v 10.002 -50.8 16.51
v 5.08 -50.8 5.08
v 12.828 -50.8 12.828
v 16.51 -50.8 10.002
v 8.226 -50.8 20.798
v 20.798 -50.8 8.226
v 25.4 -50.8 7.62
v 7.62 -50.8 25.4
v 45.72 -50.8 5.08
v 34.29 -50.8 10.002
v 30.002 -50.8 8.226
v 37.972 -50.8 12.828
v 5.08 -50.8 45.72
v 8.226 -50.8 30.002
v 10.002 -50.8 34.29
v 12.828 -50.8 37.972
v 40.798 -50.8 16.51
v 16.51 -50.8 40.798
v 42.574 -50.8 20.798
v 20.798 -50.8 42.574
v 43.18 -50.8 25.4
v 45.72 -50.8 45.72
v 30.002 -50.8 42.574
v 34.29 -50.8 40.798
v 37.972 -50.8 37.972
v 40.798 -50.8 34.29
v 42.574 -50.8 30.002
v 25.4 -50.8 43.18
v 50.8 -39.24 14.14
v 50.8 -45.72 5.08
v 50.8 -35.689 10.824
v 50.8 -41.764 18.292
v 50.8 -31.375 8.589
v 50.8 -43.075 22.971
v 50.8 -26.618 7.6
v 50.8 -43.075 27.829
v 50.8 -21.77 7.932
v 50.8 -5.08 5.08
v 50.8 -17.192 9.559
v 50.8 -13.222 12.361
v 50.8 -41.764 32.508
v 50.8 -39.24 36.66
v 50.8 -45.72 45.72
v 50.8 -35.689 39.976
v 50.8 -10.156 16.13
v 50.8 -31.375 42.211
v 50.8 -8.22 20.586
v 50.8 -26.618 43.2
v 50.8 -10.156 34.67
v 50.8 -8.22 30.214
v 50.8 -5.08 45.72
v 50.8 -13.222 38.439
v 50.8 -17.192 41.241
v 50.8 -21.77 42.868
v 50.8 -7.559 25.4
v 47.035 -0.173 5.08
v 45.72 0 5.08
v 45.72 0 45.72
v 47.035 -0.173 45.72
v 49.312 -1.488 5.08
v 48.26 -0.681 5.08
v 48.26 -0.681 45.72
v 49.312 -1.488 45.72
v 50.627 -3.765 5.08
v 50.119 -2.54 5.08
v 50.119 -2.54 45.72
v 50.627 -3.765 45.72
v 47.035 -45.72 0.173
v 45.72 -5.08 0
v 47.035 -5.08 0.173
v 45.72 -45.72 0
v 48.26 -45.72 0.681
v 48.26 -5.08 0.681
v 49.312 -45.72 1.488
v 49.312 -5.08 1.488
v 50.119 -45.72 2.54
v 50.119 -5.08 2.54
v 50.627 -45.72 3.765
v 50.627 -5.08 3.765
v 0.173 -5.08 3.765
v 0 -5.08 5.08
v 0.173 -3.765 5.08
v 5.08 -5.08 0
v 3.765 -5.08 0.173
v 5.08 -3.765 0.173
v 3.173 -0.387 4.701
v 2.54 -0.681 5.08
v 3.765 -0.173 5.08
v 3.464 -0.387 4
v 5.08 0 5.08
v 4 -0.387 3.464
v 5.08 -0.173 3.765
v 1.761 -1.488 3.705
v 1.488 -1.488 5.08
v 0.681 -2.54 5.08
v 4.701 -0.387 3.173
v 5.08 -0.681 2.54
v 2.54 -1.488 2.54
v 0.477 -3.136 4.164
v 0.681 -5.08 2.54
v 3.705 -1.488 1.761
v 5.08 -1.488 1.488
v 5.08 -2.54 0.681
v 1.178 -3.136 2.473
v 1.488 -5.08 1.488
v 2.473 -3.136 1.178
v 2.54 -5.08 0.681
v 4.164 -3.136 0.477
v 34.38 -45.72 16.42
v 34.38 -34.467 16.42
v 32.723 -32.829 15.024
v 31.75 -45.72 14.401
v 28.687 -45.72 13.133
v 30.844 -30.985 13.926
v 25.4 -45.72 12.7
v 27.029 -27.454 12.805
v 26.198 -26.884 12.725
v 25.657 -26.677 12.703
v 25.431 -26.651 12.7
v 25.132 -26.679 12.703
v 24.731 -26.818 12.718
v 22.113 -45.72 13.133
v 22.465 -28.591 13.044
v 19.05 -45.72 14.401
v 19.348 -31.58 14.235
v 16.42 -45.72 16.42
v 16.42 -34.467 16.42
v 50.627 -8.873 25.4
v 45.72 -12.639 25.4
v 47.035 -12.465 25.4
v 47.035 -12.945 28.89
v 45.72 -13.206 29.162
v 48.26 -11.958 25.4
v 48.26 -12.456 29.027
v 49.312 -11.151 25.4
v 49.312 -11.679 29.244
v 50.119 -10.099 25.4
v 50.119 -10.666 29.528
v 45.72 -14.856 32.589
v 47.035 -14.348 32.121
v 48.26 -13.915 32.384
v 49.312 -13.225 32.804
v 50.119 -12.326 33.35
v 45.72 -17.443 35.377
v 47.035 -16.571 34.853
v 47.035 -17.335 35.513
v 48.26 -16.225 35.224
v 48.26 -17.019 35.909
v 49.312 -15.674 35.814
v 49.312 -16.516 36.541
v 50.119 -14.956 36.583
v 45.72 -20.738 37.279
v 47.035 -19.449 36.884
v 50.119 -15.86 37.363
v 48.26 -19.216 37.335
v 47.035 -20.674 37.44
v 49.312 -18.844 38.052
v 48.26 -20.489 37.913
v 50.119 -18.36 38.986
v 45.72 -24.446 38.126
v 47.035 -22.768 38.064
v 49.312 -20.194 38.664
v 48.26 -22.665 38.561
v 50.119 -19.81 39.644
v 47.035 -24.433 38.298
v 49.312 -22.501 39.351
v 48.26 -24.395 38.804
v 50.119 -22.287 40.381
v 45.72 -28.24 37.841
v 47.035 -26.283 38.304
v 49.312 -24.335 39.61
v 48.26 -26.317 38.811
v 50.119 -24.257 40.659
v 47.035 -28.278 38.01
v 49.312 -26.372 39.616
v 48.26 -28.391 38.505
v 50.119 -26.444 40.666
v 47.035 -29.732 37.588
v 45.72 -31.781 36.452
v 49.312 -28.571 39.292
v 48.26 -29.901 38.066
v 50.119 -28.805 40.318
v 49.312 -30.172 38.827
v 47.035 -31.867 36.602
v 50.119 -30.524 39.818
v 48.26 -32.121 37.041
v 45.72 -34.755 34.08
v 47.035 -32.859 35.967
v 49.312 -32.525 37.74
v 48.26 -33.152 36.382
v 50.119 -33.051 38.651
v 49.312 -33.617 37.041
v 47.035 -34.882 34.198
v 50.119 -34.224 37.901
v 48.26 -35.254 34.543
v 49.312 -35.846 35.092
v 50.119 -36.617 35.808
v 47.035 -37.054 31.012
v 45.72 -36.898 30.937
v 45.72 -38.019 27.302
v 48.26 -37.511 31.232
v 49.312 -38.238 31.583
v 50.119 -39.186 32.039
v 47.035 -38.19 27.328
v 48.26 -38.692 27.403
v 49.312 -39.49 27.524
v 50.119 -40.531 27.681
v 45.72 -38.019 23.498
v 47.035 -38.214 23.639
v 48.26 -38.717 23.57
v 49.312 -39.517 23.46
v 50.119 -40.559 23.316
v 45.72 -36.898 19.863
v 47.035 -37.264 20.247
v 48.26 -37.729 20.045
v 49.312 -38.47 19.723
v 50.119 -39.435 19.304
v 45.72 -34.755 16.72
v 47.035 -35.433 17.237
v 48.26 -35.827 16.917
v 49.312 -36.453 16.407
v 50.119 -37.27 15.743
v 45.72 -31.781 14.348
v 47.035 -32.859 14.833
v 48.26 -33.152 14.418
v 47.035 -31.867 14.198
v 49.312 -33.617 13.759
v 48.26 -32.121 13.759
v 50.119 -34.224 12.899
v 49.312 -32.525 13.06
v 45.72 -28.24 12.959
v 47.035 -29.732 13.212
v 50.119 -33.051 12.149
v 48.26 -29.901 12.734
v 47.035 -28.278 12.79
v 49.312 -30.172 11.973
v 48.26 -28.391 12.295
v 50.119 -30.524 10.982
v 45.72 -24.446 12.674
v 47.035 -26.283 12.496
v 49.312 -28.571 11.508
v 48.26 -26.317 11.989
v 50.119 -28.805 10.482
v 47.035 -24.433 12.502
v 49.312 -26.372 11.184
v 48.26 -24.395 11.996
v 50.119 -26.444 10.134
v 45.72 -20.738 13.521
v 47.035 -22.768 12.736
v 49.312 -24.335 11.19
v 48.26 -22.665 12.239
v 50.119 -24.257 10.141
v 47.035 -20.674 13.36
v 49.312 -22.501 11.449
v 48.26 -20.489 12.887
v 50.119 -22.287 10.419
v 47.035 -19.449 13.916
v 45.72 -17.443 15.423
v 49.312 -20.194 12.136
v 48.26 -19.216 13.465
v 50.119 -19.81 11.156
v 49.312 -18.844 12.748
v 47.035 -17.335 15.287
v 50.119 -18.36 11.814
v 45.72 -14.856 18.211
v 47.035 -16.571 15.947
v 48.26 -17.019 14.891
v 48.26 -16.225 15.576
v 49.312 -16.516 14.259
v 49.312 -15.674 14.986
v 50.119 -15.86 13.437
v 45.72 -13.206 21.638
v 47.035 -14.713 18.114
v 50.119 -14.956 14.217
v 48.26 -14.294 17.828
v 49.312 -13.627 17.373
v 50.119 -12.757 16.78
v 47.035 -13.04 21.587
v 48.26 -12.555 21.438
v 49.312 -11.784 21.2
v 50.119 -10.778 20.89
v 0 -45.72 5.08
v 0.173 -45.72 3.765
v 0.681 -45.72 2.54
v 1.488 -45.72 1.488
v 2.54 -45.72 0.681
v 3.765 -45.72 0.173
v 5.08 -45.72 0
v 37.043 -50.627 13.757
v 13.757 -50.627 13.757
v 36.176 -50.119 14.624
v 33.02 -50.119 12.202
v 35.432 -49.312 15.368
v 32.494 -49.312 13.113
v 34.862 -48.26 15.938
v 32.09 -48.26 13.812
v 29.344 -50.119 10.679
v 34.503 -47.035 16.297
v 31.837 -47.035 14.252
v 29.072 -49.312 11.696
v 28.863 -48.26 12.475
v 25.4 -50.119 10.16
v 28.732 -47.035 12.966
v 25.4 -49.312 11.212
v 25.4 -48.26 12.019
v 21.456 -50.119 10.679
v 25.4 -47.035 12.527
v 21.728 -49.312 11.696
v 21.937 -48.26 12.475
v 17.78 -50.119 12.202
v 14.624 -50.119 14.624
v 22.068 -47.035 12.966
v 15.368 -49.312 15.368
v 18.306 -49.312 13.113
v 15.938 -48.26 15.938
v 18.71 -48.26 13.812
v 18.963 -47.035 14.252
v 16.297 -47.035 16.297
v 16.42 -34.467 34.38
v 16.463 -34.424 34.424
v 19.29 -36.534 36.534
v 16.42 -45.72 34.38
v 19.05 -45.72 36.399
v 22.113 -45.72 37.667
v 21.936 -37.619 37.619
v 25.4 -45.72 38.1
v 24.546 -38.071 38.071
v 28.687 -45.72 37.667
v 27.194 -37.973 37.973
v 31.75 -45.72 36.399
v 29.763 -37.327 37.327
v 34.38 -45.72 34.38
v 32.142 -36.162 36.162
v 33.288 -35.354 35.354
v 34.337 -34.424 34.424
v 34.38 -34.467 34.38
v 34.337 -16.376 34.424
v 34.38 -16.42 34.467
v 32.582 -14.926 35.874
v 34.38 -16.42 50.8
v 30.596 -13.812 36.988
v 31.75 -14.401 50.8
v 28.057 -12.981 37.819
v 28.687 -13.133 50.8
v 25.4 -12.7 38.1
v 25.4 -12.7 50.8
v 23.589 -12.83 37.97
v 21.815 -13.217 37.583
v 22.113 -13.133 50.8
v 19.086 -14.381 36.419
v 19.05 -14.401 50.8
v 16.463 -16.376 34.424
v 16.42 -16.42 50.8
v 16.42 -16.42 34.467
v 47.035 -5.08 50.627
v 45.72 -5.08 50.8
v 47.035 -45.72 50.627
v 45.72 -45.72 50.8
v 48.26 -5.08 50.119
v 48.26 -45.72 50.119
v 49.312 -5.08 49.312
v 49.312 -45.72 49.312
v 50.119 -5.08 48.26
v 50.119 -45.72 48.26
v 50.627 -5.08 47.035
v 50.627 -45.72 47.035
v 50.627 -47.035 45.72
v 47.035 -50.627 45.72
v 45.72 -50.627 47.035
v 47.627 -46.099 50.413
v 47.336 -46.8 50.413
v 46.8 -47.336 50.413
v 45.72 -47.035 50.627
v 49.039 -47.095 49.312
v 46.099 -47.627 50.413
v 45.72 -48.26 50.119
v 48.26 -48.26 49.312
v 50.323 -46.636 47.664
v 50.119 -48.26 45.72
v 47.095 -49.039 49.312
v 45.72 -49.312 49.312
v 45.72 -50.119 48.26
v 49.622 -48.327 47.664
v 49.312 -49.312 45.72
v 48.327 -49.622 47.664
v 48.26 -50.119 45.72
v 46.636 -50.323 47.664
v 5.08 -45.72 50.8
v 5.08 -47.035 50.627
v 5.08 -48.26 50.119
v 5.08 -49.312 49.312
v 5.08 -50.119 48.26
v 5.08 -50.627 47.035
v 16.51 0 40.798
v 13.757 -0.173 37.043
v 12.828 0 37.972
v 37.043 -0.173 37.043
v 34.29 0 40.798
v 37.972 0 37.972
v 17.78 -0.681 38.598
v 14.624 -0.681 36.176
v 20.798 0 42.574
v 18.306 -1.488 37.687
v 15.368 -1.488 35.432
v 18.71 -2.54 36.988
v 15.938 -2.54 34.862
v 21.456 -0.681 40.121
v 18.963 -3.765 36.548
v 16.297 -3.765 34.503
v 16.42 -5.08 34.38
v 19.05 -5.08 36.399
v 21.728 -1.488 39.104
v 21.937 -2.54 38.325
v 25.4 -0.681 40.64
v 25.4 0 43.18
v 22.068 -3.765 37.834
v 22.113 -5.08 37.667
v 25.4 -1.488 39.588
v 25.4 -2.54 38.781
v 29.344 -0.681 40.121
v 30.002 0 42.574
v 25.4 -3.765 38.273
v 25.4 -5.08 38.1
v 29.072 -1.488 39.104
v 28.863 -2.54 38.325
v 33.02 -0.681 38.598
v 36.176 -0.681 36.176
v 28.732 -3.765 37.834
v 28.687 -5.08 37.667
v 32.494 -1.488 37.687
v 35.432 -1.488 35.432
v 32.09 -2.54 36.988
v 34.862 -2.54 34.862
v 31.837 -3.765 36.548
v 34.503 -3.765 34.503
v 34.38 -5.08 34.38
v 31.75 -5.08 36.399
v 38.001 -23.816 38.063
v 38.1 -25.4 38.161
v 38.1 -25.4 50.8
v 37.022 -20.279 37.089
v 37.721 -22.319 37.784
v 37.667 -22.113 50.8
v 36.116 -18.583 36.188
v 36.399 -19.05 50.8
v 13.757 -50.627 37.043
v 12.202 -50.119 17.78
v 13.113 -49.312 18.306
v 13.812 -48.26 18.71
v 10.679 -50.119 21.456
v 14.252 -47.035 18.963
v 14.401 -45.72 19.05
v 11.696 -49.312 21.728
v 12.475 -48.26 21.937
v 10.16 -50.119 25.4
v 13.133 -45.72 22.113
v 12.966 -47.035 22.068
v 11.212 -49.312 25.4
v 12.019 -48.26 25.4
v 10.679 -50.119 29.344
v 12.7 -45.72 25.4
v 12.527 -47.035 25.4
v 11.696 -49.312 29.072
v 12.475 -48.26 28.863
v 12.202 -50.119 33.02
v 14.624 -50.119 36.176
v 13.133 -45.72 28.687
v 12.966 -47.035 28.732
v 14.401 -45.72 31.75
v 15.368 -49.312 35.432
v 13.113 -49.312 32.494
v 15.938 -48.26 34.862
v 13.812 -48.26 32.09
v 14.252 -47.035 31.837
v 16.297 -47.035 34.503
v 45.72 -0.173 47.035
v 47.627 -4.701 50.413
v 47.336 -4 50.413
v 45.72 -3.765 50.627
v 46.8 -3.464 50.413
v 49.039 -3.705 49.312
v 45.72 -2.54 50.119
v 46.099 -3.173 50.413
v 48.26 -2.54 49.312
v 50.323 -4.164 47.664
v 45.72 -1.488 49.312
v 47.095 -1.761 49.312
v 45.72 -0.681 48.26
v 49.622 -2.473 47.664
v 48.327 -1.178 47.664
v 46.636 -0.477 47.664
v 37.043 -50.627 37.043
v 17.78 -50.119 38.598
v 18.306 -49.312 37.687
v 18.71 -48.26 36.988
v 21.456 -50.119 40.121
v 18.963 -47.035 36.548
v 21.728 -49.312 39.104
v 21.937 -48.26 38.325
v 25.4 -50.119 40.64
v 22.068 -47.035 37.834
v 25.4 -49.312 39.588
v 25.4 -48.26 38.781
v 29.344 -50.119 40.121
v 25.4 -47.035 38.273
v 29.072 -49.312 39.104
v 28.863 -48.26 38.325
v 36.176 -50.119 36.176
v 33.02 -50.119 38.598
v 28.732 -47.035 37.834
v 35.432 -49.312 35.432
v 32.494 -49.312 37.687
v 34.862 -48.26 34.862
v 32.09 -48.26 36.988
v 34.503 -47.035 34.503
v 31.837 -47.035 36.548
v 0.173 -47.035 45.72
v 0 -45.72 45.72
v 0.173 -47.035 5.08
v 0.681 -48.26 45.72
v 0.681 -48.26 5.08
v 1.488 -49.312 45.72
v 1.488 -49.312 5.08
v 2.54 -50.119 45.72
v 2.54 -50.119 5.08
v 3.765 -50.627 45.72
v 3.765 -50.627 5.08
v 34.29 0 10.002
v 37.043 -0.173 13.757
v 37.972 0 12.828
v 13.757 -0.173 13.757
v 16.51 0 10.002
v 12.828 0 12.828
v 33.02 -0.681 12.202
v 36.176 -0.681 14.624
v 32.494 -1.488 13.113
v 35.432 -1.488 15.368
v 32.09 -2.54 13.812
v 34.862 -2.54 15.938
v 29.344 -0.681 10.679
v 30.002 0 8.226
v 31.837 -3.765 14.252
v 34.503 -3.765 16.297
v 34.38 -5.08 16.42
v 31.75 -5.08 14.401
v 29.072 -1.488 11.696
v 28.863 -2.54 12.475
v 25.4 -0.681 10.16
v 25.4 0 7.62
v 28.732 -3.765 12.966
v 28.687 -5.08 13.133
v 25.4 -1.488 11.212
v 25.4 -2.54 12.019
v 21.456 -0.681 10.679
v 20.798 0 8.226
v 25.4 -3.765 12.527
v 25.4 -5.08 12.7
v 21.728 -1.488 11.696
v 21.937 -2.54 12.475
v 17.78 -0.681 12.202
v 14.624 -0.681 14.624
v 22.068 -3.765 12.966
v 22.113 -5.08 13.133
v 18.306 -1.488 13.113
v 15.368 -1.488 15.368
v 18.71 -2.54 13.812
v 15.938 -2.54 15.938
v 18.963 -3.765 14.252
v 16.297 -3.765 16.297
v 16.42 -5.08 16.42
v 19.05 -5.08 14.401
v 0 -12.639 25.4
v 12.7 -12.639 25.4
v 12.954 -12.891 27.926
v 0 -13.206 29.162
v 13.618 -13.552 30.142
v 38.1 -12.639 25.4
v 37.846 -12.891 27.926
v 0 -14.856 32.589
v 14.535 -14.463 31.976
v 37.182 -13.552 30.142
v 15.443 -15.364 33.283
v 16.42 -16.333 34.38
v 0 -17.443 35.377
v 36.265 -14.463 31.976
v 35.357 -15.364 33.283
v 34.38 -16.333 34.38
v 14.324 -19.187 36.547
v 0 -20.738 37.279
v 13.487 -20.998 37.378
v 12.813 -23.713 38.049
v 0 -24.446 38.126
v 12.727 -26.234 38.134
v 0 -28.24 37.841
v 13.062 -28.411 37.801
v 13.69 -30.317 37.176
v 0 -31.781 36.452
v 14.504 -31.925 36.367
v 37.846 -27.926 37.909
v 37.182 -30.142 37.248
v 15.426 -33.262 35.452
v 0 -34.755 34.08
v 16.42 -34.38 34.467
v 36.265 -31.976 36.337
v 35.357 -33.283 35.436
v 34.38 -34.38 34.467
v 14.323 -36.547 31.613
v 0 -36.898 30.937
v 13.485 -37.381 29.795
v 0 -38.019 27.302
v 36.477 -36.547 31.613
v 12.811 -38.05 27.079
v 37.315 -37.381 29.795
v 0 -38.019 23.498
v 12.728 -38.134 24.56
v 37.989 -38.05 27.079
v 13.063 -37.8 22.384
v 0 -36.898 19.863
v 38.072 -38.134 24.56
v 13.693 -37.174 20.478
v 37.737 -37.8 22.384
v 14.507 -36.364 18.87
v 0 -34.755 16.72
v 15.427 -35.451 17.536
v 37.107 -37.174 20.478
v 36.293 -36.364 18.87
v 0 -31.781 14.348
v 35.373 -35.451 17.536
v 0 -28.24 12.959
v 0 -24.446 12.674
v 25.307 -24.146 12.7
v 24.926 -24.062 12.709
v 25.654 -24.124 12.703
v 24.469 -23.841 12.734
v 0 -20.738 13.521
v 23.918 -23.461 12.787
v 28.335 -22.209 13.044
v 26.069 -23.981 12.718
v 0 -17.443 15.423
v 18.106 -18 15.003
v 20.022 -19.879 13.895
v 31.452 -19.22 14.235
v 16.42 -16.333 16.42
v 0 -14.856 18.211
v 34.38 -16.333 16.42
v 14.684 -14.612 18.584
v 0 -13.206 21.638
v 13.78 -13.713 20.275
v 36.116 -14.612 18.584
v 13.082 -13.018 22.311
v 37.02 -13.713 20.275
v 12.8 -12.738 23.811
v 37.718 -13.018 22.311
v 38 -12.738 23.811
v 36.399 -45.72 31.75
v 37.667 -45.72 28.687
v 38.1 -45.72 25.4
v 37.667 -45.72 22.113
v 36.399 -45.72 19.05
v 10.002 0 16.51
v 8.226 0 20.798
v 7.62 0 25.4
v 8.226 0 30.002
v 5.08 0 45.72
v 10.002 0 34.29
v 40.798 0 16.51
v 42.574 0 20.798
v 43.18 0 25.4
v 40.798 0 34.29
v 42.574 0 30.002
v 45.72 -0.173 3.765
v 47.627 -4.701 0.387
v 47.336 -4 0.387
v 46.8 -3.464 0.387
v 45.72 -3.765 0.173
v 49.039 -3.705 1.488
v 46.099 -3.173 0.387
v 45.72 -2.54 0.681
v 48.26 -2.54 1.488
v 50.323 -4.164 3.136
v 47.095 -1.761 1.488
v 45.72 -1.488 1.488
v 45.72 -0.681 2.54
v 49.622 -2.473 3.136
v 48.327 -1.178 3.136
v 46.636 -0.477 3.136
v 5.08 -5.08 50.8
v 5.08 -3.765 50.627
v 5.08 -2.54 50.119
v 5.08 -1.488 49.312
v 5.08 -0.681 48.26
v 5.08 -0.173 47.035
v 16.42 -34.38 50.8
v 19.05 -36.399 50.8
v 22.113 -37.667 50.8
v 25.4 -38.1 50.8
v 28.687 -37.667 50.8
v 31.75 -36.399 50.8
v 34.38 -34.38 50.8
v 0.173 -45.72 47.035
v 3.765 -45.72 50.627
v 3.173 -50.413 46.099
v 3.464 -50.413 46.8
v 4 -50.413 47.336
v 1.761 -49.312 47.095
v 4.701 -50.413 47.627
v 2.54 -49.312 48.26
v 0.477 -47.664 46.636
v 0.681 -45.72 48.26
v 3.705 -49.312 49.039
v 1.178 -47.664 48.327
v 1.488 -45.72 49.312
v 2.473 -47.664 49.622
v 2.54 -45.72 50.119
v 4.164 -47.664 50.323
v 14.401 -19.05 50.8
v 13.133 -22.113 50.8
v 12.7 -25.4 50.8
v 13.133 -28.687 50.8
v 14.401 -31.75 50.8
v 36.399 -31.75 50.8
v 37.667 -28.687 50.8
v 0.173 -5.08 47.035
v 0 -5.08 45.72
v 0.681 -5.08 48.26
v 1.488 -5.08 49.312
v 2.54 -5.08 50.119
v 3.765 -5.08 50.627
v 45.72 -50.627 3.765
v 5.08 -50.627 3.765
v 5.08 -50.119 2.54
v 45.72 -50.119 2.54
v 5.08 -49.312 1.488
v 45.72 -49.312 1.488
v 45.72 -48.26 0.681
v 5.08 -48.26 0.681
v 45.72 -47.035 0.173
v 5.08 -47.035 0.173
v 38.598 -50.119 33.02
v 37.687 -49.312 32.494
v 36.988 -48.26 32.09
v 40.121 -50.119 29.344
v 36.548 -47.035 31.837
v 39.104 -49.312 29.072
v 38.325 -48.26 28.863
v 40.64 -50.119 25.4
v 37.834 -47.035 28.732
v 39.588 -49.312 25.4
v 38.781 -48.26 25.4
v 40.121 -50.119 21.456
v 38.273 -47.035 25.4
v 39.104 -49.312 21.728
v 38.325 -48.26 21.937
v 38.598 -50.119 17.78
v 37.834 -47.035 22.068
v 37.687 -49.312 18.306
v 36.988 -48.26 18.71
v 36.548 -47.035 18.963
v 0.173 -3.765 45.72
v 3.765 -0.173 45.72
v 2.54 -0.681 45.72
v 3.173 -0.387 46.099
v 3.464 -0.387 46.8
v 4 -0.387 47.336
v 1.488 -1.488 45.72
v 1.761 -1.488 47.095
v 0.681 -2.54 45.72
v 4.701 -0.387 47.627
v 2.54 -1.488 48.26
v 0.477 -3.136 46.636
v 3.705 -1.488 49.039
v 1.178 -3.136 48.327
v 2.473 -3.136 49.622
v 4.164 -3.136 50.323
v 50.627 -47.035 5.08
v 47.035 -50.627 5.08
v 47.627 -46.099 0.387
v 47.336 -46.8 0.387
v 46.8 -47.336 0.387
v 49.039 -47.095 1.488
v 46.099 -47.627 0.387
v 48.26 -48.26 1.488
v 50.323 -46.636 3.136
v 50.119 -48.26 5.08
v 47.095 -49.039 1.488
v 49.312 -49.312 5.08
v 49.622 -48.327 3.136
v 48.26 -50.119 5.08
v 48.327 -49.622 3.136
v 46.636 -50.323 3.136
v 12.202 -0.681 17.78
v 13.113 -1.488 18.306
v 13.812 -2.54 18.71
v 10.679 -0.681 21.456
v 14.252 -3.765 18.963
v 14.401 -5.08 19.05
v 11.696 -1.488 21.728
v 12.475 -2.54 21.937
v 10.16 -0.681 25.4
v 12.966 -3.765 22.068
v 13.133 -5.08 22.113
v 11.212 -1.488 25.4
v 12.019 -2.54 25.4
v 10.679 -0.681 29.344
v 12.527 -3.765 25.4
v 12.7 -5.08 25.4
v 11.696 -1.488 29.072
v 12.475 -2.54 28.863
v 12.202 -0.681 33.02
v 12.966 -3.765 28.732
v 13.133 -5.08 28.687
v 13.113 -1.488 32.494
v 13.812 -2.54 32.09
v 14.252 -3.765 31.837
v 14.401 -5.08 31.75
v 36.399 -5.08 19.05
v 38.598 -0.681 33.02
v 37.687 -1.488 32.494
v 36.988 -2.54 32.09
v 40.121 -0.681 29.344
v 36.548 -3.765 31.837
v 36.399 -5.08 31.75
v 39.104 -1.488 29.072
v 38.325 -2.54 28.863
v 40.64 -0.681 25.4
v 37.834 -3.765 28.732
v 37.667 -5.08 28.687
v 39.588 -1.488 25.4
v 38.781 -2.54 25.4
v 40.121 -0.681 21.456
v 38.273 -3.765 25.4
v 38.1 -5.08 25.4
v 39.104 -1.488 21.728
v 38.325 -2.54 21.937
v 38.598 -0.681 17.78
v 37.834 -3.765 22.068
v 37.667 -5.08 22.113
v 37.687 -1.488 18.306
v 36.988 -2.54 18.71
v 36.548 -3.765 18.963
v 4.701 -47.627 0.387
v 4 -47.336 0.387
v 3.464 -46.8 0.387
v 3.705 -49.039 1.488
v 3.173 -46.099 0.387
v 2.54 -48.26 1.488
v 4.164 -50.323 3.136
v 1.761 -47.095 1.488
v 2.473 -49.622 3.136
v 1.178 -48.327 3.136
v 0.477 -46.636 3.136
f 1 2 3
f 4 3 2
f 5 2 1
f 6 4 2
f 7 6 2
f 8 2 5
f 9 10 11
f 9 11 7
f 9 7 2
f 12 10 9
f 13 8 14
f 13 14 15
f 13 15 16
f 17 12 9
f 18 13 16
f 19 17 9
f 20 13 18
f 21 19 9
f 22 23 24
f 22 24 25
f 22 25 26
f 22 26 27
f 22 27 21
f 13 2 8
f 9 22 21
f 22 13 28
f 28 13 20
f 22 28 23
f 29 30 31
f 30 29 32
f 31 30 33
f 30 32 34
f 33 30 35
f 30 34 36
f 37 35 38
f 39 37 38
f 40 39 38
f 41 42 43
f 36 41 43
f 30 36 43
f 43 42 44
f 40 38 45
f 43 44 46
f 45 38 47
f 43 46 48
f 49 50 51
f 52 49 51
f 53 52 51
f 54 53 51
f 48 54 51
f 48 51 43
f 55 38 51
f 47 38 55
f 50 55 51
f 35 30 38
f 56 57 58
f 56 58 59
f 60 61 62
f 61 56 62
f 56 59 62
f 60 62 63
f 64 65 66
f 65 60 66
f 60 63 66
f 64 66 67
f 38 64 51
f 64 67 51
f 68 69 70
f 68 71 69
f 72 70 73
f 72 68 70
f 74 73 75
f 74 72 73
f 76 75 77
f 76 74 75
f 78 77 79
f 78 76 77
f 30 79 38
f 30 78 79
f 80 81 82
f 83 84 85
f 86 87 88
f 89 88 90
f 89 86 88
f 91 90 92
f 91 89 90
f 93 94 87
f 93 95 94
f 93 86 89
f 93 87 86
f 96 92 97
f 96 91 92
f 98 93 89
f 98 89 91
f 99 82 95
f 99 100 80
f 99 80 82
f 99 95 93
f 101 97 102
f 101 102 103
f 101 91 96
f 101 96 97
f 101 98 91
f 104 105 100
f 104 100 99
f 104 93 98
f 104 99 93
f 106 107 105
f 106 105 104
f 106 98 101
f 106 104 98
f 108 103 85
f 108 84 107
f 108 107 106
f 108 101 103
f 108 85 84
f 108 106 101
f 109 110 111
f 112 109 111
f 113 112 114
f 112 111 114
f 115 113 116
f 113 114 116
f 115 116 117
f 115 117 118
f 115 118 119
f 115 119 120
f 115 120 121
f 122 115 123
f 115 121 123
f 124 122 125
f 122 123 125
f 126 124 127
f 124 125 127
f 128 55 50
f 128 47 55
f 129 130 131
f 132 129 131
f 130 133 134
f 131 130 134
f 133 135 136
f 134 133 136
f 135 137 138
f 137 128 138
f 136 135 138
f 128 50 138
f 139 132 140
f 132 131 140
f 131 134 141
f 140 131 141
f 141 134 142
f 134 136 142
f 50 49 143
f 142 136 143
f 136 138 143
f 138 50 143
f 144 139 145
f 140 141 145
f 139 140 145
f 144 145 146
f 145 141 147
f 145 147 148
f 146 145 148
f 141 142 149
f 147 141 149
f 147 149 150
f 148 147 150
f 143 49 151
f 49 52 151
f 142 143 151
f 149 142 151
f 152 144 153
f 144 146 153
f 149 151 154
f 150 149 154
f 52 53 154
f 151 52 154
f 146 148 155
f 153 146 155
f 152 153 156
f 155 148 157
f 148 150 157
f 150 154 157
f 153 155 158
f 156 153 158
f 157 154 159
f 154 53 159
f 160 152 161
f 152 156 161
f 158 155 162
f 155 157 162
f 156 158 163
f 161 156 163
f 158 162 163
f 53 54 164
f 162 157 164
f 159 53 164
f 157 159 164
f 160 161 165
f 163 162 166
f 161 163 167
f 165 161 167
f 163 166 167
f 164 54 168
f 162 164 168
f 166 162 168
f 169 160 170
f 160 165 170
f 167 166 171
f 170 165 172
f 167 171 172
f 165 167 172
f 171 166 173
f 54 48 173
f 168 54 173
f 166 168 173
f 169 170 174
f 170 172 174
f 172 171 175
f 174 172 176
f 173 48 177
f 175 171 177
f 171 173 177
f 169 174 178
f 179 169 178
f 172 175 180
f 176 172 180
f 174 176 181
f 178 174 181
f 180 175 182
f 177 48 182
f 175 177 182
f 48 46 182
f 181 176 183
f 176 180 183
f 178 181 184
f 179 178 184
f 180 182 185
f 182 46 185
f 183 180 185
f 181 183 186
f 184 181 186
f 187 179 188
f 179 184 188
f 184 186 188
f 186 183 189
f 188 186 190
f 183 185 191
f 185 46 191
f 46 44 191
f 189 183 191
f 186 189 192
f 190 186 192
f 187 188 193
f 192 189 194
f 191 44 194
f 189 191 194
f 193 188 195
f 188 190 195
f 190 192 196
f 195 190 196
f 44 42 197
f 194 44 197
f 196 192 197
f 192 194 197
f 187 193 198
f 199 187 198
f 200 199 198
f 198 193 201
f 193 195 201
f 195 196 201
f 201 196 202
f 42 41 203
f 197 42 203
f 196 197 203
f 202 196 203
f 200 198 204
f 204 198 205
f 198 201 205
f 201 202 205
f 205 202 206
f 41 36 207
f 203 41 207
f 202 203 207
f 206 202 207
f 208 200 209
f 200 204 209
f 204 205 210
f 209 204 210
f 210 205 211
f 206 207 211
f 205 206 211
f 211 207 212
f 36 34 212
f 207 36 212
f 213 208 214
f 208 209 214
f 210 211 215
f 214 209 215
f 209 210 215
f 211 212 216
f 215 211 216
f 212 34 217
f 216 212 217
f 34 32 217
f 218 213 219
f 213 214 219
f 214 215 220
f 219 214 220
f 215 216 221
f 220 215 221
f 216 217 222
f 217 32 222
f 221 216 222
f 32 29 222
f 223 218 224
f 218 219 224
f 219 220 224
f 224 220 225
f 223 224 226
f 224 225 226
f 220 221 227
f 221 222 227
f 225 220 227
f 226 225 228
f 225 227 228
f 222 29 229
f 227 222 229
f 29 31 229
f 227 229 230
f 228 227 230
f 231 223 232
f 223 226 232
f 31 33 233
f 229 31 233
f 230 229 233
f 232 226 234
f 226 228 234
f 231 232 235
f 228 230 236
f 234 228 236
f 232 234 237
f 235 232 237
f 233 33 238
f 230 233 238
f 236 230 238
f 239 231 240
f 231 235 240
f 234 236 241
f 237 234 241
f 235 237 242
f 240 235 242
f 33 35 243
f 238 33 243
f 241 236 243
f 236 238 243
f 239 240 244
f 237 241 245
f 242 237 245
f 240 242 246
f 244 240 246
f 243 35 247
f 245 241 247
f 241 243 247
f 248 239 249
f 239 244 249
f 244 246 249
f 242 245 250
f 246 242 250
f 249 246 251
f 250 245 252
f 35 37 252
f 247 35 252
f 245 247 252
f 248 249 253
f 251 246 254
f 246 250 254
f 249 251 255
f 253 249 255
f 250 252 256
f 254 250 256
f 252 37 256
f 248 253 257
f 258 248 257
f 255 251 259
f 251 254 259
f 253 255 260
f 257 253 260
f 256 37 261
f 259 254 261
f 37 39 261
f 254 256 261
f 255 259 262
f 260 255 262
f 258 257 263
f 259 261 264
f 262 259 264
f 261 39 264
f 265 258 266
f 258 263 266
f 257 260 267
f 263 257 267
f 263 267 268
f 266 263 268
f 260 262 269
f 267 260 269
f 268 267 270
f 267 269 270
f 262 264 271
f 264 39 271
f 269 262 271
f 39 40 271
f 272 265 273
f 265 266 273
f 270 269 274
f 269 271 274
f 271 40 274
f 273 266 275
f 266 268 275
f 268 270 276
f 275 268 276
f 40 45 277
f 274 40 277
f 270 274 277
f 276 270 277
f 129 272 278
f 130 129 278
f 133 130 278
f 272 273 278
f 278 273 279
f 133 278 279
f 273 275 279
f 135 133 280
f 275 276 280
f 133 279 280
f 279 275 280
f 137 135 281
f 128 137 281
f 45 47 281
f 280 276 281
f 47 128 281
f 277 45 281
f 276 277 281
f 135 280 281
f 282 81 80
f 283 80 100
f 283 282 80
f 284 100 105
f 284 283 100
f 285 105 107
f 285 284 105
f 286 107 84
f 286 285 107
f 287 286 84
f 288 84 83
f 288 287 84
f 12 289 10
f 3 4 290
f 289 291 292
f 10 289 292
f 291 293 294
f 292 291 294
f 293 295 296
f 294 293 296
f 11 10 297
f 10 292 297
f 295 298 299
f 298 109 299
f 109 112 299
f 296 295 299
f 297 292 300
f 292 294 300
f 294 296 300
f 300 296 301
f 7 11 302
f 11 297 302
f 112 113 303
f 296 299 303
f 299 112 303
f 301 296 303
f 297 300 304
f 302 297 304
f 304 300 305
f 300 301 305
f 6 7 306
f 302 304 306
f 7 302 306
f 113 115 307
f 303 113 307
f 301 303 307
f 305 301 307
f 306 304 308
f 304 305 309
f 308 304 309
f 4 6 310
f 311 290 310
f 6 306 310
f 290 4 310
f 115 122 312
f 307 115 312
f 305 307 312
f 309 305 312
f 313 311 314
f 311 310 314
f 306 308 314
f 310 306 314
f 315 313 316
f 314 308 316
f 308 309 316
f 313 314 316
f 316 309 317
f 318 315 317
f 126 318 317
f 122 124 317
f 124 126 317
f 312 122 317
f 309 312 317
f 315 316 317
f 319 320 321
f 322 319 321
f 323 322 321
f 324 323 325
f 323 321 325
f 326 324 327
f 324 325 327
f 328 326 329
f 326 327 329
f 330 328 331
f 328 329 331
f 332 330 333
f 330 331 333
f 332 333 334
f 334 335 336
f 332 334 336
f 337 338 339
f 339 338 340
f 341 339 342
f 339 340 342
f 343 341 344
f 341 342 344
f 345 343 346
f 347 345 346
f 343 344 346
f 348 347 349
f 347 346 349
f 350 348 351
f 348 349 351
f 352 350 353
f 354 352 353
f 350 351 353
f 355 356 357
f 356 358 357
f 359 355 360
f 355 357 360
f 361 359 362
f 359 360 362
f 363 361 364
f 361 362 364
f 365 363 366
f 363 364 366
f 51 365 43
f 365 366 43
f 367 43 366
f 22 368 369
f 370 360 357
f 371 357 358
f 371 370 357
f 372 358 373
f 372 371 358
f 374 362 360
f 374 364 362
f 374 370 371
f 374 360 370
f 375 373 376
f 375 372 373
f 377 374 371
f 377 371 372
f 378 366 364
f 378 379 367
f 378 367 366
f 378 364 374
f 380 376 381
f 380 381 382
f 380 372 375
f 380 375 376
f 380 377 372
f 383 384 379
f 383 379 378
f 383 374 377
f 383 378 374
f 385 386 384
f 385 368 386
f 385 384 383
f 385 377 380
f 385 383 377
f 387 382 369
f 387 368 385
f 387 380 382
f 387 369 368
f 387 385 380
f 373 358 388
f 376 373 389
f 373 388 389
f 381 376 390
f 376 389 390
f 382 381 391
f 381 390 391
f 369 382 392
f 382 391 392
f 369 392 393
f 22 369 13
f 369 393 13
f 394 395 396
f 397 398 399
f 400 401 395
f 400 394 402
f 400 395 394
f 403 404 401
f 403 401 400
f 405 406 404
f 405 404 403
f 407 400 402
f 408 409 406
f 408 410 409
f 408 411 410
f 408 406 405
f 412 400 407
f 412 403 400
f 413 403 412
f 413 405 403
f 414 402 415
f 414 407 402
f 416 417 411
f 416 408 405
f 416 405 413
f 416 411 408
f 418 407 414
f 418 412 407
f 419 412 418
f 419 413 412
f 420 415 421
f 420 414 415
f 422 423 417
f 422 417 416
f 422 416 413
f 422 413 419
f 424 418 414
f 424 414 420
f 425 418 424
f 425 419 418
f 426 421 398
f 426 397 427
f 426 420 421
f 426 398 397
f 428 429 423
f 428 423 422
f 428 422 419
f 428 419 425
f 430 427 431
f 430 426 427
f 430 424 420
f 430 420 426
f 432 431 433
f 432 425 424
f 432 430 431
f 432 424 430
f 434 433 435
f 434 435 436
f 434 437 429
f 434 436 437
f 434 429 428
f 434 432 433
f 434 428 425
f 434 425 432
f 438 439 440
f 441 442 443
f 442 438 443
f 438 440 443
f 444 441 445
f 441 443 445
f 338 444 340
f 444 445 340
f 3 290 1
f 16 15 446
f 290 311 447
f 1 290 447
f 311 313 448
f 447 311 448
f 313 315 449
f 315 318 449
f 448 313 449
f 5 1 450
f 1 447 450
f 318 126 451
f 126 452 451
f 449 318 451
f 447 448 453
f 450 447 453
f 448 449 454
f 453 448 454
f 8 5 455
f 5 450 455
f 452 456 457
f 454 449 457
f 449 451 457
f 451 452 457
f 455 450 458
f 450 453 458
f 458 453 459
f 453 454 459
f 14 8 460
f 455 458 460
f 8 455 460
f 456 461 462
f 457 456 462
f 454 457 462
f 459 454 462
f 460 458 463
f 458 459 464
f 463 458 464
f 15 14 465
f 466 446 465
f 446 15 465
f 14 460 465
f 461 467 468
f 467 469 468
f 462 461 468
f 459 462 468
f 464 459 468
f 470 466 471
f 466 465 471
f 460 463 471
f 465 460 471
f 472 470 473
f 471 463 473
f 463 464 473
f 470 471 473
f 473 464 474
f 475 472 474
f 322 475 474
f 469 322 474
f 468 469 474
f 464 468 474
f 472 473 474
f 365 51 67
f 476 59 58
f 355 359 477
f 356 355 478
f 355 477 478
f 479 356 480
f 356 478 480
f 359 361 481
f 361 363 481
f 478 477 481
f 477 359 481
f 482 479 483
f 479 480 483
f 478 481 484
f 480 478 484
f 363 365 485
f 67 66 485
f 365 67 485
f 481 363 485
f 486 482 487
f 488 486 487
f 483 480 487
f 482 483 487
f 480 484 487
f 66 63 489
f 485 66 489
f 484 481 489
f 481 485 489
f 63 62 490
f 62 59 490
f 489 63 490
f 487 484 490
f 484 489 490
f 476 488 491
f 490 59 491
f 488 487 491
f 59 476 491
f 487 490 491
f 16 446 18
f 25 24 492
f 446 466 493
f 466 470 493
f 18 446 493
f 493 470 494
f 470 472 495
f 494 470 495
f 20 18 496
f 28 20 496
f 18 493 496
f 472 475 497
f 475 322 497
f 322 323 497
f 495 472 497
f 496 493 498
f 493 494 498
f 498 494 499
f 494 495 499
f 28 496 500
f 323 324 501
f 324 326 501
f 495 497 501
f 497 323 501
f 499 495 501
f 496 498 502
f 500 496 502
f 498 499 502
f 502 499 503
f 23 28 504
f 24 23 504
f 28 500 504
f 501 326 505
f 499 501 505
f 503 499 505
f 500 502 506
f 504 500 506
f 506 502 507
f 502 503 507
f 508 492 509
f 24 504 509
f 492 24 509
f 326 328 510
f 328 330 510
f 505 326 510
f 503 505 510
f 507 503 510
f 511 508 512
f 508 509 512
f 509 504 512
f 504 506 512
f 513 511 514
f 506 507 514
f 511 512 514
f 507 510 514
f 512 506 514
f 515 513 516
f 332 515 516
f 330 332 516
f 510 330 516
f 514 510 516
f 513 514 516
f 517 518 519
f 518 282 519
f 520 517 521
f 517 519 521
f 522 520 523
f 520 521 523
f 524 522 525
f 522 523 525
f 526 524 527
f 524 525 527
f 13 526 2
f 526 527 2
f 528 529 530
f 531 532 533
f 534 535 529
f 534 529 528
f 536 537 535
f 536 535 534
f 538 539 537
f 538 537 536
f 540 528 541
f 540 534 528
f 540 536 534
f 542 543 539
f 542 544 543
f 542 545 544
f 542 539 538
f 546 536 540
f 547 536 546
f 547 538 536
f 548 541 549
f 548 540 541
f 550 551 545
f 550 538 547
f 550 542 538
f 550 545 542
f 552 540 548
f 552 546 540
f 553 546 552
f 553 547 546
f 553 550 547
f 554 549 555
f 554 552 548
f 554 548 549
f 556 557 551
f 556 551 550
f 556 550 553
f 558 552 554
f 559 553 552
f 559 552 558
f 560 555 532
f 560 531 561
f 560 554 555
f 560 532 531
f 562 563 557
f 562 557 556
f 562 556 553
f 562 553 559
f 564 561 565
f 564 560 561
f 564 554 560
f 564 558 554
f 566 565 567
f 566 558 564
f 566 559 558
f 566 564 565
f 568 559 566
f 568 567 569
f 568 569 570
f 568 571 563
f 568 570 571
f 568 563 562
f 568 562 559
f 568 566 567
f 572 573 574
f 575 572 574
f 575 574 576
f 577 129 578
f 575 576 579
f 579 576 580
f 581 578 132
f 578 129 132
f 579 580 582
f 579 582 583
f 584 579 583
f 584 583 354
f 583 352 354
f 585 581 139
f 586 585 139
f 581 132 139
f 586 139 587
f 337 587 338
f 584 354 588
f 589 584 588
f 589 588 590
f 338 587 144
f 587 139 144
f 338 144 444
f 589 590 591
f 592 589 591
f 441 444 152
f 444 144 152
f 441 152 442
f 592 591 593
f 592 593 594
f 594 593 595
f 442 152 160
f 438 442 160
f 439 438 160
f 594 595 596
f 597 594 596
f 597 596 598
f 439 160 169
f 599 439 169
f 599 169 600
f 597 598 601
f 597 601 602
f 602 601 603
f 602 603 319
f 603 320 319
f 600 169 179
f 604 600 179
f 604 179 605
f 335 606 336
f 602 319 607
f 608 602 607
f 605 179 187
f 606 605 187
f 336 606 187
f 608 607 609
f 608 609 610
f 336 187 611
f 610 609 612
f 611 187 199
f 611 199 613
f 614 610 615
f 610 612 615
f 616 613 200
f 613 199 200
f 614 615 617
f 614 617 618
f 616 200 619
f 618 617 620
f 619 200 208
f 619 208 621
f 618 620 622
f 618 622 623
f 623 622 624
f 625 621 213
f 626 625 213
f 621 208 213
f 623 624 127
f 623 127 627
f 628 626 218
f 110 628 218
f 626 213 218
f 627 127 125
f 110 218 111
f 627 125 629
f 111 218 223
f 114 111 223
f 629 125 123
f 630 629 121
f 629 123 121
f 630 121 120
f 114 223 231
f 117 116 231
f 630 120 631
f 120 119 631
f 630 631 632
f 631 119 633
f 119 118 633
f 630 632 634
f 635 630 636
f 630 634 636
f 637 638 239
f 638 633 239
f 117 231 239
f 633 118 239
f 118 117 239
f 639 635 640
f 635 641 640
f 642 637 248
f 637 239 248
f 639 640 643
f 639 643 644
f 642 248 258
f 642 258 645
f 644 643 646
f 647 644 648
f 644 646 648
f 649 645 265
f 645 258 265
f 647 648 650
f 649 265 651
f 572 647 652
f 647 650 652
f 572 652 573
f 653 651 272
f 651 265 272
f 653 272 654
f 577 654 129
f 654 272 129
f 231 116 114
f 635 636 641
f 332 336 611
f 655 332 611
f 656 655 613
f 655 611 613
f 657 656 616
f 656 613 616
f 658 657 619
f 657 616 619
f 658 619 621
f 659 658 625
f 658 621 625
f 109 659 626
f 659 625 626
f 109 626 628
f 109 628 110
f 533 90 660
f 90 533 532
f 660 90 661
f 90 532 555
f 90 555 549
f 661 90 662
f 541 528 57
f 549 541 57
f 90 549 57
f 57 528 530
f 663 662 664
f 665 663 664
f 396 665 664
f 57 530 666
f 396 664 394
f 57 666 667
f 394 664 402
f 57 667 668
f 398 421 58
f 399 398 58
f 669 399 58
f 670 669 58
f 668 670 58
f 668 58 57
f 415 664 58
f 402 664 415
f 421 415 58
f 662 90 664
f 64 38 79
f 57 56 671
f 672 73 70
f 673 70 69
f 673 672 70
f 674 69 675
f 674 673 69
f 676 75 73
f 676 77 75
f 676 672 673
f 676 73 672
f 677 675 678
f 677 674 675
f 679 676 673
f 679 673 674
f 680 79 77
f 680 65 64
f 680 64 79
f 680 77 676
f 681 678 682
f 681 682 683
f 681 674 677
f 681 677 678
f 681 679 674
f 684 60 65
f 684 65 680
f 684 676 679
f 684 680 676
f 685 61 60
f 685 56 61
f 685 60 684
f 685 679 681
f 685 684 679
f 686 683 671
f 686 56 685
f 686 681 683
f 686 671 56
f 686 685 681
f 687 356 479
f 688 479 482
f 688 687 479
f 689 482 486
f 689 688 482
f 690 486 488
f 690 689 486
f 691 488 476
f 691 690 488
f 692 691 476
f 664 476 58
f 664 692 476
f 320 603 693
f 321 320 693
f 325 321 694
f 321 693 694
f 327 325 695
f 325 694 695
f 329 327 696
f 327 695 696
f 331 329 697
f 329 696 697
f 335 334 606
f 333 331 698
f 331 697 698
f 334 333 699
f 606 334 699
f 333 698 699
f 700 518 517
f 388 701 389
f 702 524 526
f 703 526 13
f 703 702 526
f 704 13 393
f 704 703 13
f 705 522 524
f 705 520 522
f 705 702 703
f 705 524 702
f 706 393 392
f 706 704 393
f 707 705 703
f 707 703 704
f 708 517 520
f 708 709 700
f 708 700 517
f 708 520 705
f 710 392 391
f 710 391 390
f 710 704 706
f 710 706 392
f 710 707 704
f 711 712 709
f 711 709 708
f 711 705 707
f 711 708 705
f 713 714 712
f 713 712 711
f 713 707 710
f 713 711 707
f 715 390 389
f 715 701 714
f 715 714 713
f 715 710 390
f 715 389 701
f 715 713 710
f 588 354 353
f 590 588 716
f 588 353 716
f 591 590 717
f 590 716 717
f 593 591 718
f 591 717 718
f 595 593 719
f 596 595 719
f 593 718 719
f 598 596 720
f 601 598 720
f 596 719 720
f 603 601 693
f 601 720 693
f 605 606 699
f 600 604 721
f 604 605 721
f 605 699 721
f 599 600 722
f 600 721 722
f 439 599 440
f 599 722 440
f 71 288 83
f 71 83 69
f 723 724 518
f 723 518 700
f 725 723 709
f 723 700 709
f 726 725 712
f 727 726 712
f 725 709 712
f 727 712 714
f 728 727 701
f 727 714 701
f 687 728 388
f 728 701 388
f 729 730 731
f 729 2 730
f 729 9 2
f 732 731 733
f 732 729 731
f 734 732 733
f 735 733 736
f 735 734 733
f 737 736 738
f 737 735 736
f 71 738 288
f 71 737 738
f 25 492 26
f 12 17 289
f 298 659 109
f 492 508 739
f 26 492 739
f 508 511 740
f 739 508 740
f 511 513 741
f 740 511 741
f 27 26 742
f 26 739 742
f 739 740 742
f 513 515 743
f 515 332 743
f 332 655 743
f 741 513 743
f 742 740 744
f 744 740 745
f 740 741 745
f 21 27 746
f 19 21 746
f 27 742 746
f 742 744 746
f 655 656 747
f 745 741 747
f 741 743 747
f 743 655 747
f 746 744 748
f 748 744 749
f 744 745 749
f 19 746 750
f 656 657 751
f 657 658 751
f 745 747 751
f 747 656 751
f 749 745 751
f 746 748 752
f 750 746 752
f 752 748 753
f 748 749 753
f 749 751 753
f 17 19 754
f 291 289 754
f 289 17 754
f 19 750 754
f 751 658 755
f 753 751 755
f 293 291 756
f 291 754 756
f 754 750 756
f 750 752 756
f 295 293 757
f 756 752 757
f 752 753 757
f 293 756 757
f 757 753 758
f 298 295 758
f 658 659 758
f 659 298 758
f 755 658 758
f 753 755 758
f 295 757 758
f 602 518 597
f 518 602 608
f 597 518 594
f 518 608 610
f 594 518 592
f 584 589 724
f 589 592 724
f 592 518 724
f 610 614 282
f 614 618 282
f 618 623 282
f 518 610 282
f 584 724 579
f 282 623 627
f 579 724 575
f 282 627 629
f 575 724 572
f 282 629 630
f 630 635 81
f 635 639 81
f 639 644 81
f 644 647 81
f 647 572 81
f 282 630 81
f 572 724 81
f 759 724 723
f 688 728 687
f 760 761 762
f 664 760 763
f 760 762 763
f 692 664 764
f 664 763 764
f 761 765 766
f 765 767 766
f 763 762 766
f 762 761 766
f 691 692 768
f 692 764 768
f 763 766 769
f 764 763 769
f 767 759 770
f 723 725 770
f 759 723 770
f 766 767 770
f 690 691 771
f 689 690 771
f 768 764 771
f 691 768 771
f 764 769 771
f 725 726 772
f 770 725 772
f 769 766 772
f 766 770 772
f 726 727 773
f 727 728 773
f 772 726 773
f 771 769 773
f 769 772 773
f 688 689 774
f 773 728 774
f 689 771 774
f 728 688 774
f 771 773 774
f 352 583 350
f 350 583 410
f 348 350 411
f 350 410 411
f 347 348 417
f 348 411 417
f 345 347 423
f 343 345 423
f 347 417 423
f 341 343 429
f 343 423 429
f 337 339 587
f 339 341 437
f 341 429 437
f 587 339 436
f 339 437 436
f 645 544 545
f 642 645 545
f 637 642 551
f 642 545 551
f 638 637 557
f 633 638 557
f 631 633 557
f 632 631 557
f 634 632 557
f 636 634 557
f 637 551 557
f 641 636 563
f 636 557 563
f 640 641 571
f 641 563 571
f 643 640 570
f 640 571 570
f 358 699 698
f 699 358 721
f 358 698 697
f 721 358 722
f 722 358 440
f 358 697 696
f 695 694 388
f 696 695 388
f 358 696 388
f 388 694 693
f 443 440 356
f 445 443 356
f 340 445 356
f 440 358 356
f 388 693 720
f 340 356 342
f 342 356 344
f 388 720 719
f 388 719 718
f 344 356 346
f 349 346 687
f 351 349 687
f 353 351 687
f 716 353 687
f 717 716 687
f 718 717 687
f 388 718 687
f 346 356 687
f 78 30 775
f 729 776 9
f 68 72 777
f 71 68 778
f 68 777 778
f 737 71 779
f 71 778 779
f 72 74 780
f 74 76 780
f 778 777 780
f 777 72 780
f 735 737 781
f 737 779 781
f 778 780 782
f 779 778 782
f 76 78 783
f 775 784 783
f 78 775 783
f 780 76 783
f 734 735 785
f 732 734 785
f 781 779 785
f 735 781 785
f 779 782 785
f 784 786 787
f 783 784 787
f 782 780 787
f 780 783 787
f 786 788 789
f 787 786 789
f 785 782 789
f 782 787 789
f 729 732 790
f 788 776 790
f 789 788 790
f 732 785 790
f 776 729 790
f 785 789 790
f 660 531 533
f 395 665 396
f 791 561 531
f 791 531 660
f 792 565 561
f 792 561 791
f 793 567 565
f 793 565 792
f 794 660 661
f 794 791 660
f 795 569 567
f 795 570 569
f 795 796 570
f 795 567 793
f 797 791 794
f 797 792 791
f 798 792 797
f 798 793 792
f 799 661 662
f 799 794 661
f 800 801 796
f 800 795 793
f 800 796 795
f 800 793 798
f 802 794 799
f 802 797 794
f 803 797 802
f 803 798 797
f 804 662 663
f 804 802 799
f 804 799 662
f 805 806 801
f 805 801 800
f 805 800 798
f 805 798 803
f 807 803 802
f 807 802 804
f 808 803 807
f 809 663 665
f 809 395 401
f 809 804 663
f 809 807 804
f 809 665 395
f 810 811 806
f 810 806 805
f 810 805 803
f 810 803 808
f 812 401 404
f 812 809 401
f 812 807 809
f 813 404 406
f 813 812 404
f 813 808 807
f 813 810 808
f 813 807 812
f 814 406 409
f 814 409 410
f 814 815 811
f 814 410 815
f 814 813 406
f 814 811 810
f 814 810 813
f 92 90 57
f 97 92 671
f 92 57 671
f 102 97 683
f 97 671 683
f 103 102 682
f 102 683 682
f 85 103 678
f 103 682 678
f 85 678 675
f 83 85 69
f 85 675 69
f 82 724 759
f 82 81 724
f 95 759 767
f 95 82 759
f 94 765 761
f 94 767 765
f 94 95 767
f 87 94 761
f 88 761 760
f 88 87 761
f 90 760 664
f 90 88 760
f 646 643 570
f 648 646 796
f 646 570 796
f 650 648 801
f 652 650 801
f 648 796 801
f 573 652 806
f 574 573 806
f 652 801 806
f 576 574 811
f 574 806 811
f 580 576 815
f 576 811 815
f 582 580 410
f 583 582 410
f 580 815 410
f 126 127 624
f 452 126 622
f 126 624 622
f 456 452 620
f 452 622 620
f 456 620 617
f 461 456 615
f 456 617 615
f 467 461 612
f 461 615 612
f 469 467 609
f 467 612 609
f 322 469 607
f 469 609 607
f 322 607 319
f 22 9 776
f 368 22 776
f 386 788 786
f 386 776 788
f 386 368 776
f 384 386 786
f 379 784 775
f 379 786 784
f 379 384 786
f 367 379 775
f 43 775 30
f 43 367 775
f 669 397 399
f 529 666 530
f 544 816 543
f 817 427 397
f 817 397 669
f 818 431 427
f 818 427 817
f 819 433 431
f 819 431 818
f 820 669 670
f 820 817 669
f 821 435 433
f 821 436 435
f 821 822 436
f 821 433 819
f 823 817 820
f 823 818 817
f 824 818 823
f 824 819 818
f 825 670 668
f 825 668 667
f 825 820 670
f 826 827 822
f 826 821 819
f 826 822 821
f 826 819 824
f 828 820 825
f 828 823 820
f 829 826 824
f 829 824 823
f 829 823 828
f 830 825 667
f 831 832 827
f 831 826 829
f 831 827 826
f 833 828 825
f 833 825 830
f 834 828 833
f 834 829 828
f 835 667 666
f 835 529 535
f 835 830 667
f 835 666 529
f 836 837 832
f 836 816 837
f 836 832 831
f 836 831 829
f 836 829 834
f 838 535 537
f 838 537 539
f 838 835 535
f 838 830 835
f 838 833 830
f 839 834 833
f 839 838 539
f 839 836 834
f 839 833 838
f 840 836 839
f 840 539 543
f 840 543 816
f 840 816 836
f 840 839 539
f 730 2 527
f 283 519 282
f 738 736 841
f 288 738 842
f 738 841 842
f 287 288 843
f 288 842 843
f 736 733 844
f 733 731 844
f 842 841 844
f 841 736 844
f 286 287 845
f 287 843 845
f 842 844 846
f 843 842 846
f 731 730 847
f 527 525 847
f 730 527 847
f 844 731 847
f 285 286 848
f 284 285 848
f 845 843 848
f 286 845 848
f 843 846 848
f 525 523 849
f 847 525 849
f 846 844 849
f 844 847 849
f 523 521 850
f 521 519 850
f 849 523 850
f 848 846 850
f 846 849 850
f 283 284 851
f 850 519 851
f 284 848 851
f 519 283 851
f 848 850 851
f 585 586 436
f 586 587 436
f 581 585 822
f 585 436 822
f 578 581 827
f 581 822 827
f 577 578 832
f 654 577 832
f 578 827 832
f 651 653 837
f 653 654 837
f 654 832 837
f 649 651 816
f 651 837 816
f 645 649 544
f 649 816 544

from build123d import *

# Parameters (mm, degrees)
F1_DEPTH = 50.8
F3_R     = 12.7614495694
F4_DEPTH = 50.8
F5_DEPTH = 25.4
F6_R     = 5.08


with BuildPart() as f1:
    # F0 (on Front) → F1 (new body)
    with BuildSketch(Plane.XZ):
        with BuildLine():
            Line((0, 50.8000037167), (0, 0))
            Line((0, 0), (16.4197442074, 16.4197454088))
            ThreePointArc((16.4197442074, 16.4197454088), (12.7, 25.4000018583), (16.4197442074, 34.3802583079))
            Line((16.4197442074, 34.3802583079), (0, 50.8000037167))
        make_face()
        with BuildLine():
            Line((50.8, 50.8000037167), (0, 50.8000037167))
            Line((0, 50.8000037167), (16.4197442074, 34.3802583079))
            ThreePointArc((16.4197442074, 34.3802583079), (25.4, 38.1000018583), (34.3802557926, 34.3802583079))
            Line((34.3802557926, 34.3802583079), (50.8, 50.8000037167))
        make_face()
        with BuildLine():
            Line((34.3802557926, 16.4197454088), (50.8, 0))
            Line((50.8, 0), (50.8, 50.8000037167))
            Line((50.8, 50.8000037167), (34.3802557926, 34.3802583079))
            ThreePointArc((34.3802557926, 34.3802583079), (37.133269974, 30.260081664), (38.1, 25.4000018583))
            ThreePointArc((38.1, 25.4000018583), (37.133269974, 20.5399220527), (34.3802557926, 16.4197454088))
        make_face()
        with BuildLine():
            Line((16.4197442074, 16.4197454088), (0, 0))
            Line((0, 0), (50.8, 0))
            Line((50.8, 0), (34.3802557926, 16.4197454088))
            ThreePointArc((34.3802557926, 16.4197454088), (25.4, 12.7000018583), (16.4197442074, 16.4197454088))
        make_face()
    extrude(amount=F1_DEPTH)

    # F3 (on face) → F4 (cut)
    with BuildSketch(Plane.YZ.offset(50.8)):
        with Locations((-25.4, 25.4000018583)):
            Circle(F3_R)
    extrude(amount=-F4_DEPTH, mode=Mode.SUBTRACT)

    # F2 (on face) → F5 (cut)
    with BuildSketch(Plane.XY.offset(50.8000037167)):
        with BuildLine():
            ThreePointArc((38.1, -25.4), (37.1332700629, -20.539920409), (34.3802561211, -16.4197438789))
            Line((34.3802561211, -16.4197438789), (25.4, -25.4))
            Line((25.4, -25.4), (34.3802561211, -34.3802561211))
            ThreePointArc((34.3802561211, -34.3802561211), (37.1332700629, -30.260079591), (38.1, -25.4))
        make_face()
        with BuildLine():
            Line((25.4, -25.4), (34.3802561211, -16.4197438789))
            ThreePointArc((34.3802561211, -16.4197438789), (25.4, -12.7), (16.4197438789, -16.4197438789))
            Line((16.4197438789, -16.4197438789), (25.4, -25.4))
        make_face()
        with BuildLine():
            Line((34.3802561211, -34.3802561211), (25.4, -25.4))
            Line((25.4, -25.4), (16.4197438789, -34.3802561211))
            ThreePointArc((16.4197438789, -34.3802561211), (25.4, -38.1), (34.3802561211, -34.3802561211))
        make_face()
        with BuildLine():
            Line((16.4197438789, -34.3802561211), (25.4, -25.4))
            Line((25.4, -25.4), (16.4197438789, -16.4197438789))
            ThreePointArc((16.4197438789, -16.4197438789), (12.7, -25.4), (16.4197438789, -34.3802561211))
        make_face()
    extrude(amount=-F5_DEPTH, mode=Mode.SUBTRACT)

    # F6
    f6_edges = [f1.edges().sort_by_distance(p)[0] for p in [
        (0, -25.4, 50.800004),
        (0, -50.8, 25.400002),
        (50.8, -50.8, 25.400002),
        (50.8, 0, 25.400002),
        (50.8, -25.4, 50.800004),
        (50.8, -25.4, 0),
        (50.8, -38.16145, 25.400002),
        (25.4, -50.8, 0),
        (25.4, -50.8, 50.800004),
        (16.419744, -50.8, 34.380258),
        (0, -25.4, 0),
        (0, 0, 25.400002),
        (25.4, 0, 50.800004),
        (25.4, 0, 0),
        (16.419744, 0, 34.380258),
    ]]
    fillet(f6_edges, radius=F6_R)


solid = f1.part
